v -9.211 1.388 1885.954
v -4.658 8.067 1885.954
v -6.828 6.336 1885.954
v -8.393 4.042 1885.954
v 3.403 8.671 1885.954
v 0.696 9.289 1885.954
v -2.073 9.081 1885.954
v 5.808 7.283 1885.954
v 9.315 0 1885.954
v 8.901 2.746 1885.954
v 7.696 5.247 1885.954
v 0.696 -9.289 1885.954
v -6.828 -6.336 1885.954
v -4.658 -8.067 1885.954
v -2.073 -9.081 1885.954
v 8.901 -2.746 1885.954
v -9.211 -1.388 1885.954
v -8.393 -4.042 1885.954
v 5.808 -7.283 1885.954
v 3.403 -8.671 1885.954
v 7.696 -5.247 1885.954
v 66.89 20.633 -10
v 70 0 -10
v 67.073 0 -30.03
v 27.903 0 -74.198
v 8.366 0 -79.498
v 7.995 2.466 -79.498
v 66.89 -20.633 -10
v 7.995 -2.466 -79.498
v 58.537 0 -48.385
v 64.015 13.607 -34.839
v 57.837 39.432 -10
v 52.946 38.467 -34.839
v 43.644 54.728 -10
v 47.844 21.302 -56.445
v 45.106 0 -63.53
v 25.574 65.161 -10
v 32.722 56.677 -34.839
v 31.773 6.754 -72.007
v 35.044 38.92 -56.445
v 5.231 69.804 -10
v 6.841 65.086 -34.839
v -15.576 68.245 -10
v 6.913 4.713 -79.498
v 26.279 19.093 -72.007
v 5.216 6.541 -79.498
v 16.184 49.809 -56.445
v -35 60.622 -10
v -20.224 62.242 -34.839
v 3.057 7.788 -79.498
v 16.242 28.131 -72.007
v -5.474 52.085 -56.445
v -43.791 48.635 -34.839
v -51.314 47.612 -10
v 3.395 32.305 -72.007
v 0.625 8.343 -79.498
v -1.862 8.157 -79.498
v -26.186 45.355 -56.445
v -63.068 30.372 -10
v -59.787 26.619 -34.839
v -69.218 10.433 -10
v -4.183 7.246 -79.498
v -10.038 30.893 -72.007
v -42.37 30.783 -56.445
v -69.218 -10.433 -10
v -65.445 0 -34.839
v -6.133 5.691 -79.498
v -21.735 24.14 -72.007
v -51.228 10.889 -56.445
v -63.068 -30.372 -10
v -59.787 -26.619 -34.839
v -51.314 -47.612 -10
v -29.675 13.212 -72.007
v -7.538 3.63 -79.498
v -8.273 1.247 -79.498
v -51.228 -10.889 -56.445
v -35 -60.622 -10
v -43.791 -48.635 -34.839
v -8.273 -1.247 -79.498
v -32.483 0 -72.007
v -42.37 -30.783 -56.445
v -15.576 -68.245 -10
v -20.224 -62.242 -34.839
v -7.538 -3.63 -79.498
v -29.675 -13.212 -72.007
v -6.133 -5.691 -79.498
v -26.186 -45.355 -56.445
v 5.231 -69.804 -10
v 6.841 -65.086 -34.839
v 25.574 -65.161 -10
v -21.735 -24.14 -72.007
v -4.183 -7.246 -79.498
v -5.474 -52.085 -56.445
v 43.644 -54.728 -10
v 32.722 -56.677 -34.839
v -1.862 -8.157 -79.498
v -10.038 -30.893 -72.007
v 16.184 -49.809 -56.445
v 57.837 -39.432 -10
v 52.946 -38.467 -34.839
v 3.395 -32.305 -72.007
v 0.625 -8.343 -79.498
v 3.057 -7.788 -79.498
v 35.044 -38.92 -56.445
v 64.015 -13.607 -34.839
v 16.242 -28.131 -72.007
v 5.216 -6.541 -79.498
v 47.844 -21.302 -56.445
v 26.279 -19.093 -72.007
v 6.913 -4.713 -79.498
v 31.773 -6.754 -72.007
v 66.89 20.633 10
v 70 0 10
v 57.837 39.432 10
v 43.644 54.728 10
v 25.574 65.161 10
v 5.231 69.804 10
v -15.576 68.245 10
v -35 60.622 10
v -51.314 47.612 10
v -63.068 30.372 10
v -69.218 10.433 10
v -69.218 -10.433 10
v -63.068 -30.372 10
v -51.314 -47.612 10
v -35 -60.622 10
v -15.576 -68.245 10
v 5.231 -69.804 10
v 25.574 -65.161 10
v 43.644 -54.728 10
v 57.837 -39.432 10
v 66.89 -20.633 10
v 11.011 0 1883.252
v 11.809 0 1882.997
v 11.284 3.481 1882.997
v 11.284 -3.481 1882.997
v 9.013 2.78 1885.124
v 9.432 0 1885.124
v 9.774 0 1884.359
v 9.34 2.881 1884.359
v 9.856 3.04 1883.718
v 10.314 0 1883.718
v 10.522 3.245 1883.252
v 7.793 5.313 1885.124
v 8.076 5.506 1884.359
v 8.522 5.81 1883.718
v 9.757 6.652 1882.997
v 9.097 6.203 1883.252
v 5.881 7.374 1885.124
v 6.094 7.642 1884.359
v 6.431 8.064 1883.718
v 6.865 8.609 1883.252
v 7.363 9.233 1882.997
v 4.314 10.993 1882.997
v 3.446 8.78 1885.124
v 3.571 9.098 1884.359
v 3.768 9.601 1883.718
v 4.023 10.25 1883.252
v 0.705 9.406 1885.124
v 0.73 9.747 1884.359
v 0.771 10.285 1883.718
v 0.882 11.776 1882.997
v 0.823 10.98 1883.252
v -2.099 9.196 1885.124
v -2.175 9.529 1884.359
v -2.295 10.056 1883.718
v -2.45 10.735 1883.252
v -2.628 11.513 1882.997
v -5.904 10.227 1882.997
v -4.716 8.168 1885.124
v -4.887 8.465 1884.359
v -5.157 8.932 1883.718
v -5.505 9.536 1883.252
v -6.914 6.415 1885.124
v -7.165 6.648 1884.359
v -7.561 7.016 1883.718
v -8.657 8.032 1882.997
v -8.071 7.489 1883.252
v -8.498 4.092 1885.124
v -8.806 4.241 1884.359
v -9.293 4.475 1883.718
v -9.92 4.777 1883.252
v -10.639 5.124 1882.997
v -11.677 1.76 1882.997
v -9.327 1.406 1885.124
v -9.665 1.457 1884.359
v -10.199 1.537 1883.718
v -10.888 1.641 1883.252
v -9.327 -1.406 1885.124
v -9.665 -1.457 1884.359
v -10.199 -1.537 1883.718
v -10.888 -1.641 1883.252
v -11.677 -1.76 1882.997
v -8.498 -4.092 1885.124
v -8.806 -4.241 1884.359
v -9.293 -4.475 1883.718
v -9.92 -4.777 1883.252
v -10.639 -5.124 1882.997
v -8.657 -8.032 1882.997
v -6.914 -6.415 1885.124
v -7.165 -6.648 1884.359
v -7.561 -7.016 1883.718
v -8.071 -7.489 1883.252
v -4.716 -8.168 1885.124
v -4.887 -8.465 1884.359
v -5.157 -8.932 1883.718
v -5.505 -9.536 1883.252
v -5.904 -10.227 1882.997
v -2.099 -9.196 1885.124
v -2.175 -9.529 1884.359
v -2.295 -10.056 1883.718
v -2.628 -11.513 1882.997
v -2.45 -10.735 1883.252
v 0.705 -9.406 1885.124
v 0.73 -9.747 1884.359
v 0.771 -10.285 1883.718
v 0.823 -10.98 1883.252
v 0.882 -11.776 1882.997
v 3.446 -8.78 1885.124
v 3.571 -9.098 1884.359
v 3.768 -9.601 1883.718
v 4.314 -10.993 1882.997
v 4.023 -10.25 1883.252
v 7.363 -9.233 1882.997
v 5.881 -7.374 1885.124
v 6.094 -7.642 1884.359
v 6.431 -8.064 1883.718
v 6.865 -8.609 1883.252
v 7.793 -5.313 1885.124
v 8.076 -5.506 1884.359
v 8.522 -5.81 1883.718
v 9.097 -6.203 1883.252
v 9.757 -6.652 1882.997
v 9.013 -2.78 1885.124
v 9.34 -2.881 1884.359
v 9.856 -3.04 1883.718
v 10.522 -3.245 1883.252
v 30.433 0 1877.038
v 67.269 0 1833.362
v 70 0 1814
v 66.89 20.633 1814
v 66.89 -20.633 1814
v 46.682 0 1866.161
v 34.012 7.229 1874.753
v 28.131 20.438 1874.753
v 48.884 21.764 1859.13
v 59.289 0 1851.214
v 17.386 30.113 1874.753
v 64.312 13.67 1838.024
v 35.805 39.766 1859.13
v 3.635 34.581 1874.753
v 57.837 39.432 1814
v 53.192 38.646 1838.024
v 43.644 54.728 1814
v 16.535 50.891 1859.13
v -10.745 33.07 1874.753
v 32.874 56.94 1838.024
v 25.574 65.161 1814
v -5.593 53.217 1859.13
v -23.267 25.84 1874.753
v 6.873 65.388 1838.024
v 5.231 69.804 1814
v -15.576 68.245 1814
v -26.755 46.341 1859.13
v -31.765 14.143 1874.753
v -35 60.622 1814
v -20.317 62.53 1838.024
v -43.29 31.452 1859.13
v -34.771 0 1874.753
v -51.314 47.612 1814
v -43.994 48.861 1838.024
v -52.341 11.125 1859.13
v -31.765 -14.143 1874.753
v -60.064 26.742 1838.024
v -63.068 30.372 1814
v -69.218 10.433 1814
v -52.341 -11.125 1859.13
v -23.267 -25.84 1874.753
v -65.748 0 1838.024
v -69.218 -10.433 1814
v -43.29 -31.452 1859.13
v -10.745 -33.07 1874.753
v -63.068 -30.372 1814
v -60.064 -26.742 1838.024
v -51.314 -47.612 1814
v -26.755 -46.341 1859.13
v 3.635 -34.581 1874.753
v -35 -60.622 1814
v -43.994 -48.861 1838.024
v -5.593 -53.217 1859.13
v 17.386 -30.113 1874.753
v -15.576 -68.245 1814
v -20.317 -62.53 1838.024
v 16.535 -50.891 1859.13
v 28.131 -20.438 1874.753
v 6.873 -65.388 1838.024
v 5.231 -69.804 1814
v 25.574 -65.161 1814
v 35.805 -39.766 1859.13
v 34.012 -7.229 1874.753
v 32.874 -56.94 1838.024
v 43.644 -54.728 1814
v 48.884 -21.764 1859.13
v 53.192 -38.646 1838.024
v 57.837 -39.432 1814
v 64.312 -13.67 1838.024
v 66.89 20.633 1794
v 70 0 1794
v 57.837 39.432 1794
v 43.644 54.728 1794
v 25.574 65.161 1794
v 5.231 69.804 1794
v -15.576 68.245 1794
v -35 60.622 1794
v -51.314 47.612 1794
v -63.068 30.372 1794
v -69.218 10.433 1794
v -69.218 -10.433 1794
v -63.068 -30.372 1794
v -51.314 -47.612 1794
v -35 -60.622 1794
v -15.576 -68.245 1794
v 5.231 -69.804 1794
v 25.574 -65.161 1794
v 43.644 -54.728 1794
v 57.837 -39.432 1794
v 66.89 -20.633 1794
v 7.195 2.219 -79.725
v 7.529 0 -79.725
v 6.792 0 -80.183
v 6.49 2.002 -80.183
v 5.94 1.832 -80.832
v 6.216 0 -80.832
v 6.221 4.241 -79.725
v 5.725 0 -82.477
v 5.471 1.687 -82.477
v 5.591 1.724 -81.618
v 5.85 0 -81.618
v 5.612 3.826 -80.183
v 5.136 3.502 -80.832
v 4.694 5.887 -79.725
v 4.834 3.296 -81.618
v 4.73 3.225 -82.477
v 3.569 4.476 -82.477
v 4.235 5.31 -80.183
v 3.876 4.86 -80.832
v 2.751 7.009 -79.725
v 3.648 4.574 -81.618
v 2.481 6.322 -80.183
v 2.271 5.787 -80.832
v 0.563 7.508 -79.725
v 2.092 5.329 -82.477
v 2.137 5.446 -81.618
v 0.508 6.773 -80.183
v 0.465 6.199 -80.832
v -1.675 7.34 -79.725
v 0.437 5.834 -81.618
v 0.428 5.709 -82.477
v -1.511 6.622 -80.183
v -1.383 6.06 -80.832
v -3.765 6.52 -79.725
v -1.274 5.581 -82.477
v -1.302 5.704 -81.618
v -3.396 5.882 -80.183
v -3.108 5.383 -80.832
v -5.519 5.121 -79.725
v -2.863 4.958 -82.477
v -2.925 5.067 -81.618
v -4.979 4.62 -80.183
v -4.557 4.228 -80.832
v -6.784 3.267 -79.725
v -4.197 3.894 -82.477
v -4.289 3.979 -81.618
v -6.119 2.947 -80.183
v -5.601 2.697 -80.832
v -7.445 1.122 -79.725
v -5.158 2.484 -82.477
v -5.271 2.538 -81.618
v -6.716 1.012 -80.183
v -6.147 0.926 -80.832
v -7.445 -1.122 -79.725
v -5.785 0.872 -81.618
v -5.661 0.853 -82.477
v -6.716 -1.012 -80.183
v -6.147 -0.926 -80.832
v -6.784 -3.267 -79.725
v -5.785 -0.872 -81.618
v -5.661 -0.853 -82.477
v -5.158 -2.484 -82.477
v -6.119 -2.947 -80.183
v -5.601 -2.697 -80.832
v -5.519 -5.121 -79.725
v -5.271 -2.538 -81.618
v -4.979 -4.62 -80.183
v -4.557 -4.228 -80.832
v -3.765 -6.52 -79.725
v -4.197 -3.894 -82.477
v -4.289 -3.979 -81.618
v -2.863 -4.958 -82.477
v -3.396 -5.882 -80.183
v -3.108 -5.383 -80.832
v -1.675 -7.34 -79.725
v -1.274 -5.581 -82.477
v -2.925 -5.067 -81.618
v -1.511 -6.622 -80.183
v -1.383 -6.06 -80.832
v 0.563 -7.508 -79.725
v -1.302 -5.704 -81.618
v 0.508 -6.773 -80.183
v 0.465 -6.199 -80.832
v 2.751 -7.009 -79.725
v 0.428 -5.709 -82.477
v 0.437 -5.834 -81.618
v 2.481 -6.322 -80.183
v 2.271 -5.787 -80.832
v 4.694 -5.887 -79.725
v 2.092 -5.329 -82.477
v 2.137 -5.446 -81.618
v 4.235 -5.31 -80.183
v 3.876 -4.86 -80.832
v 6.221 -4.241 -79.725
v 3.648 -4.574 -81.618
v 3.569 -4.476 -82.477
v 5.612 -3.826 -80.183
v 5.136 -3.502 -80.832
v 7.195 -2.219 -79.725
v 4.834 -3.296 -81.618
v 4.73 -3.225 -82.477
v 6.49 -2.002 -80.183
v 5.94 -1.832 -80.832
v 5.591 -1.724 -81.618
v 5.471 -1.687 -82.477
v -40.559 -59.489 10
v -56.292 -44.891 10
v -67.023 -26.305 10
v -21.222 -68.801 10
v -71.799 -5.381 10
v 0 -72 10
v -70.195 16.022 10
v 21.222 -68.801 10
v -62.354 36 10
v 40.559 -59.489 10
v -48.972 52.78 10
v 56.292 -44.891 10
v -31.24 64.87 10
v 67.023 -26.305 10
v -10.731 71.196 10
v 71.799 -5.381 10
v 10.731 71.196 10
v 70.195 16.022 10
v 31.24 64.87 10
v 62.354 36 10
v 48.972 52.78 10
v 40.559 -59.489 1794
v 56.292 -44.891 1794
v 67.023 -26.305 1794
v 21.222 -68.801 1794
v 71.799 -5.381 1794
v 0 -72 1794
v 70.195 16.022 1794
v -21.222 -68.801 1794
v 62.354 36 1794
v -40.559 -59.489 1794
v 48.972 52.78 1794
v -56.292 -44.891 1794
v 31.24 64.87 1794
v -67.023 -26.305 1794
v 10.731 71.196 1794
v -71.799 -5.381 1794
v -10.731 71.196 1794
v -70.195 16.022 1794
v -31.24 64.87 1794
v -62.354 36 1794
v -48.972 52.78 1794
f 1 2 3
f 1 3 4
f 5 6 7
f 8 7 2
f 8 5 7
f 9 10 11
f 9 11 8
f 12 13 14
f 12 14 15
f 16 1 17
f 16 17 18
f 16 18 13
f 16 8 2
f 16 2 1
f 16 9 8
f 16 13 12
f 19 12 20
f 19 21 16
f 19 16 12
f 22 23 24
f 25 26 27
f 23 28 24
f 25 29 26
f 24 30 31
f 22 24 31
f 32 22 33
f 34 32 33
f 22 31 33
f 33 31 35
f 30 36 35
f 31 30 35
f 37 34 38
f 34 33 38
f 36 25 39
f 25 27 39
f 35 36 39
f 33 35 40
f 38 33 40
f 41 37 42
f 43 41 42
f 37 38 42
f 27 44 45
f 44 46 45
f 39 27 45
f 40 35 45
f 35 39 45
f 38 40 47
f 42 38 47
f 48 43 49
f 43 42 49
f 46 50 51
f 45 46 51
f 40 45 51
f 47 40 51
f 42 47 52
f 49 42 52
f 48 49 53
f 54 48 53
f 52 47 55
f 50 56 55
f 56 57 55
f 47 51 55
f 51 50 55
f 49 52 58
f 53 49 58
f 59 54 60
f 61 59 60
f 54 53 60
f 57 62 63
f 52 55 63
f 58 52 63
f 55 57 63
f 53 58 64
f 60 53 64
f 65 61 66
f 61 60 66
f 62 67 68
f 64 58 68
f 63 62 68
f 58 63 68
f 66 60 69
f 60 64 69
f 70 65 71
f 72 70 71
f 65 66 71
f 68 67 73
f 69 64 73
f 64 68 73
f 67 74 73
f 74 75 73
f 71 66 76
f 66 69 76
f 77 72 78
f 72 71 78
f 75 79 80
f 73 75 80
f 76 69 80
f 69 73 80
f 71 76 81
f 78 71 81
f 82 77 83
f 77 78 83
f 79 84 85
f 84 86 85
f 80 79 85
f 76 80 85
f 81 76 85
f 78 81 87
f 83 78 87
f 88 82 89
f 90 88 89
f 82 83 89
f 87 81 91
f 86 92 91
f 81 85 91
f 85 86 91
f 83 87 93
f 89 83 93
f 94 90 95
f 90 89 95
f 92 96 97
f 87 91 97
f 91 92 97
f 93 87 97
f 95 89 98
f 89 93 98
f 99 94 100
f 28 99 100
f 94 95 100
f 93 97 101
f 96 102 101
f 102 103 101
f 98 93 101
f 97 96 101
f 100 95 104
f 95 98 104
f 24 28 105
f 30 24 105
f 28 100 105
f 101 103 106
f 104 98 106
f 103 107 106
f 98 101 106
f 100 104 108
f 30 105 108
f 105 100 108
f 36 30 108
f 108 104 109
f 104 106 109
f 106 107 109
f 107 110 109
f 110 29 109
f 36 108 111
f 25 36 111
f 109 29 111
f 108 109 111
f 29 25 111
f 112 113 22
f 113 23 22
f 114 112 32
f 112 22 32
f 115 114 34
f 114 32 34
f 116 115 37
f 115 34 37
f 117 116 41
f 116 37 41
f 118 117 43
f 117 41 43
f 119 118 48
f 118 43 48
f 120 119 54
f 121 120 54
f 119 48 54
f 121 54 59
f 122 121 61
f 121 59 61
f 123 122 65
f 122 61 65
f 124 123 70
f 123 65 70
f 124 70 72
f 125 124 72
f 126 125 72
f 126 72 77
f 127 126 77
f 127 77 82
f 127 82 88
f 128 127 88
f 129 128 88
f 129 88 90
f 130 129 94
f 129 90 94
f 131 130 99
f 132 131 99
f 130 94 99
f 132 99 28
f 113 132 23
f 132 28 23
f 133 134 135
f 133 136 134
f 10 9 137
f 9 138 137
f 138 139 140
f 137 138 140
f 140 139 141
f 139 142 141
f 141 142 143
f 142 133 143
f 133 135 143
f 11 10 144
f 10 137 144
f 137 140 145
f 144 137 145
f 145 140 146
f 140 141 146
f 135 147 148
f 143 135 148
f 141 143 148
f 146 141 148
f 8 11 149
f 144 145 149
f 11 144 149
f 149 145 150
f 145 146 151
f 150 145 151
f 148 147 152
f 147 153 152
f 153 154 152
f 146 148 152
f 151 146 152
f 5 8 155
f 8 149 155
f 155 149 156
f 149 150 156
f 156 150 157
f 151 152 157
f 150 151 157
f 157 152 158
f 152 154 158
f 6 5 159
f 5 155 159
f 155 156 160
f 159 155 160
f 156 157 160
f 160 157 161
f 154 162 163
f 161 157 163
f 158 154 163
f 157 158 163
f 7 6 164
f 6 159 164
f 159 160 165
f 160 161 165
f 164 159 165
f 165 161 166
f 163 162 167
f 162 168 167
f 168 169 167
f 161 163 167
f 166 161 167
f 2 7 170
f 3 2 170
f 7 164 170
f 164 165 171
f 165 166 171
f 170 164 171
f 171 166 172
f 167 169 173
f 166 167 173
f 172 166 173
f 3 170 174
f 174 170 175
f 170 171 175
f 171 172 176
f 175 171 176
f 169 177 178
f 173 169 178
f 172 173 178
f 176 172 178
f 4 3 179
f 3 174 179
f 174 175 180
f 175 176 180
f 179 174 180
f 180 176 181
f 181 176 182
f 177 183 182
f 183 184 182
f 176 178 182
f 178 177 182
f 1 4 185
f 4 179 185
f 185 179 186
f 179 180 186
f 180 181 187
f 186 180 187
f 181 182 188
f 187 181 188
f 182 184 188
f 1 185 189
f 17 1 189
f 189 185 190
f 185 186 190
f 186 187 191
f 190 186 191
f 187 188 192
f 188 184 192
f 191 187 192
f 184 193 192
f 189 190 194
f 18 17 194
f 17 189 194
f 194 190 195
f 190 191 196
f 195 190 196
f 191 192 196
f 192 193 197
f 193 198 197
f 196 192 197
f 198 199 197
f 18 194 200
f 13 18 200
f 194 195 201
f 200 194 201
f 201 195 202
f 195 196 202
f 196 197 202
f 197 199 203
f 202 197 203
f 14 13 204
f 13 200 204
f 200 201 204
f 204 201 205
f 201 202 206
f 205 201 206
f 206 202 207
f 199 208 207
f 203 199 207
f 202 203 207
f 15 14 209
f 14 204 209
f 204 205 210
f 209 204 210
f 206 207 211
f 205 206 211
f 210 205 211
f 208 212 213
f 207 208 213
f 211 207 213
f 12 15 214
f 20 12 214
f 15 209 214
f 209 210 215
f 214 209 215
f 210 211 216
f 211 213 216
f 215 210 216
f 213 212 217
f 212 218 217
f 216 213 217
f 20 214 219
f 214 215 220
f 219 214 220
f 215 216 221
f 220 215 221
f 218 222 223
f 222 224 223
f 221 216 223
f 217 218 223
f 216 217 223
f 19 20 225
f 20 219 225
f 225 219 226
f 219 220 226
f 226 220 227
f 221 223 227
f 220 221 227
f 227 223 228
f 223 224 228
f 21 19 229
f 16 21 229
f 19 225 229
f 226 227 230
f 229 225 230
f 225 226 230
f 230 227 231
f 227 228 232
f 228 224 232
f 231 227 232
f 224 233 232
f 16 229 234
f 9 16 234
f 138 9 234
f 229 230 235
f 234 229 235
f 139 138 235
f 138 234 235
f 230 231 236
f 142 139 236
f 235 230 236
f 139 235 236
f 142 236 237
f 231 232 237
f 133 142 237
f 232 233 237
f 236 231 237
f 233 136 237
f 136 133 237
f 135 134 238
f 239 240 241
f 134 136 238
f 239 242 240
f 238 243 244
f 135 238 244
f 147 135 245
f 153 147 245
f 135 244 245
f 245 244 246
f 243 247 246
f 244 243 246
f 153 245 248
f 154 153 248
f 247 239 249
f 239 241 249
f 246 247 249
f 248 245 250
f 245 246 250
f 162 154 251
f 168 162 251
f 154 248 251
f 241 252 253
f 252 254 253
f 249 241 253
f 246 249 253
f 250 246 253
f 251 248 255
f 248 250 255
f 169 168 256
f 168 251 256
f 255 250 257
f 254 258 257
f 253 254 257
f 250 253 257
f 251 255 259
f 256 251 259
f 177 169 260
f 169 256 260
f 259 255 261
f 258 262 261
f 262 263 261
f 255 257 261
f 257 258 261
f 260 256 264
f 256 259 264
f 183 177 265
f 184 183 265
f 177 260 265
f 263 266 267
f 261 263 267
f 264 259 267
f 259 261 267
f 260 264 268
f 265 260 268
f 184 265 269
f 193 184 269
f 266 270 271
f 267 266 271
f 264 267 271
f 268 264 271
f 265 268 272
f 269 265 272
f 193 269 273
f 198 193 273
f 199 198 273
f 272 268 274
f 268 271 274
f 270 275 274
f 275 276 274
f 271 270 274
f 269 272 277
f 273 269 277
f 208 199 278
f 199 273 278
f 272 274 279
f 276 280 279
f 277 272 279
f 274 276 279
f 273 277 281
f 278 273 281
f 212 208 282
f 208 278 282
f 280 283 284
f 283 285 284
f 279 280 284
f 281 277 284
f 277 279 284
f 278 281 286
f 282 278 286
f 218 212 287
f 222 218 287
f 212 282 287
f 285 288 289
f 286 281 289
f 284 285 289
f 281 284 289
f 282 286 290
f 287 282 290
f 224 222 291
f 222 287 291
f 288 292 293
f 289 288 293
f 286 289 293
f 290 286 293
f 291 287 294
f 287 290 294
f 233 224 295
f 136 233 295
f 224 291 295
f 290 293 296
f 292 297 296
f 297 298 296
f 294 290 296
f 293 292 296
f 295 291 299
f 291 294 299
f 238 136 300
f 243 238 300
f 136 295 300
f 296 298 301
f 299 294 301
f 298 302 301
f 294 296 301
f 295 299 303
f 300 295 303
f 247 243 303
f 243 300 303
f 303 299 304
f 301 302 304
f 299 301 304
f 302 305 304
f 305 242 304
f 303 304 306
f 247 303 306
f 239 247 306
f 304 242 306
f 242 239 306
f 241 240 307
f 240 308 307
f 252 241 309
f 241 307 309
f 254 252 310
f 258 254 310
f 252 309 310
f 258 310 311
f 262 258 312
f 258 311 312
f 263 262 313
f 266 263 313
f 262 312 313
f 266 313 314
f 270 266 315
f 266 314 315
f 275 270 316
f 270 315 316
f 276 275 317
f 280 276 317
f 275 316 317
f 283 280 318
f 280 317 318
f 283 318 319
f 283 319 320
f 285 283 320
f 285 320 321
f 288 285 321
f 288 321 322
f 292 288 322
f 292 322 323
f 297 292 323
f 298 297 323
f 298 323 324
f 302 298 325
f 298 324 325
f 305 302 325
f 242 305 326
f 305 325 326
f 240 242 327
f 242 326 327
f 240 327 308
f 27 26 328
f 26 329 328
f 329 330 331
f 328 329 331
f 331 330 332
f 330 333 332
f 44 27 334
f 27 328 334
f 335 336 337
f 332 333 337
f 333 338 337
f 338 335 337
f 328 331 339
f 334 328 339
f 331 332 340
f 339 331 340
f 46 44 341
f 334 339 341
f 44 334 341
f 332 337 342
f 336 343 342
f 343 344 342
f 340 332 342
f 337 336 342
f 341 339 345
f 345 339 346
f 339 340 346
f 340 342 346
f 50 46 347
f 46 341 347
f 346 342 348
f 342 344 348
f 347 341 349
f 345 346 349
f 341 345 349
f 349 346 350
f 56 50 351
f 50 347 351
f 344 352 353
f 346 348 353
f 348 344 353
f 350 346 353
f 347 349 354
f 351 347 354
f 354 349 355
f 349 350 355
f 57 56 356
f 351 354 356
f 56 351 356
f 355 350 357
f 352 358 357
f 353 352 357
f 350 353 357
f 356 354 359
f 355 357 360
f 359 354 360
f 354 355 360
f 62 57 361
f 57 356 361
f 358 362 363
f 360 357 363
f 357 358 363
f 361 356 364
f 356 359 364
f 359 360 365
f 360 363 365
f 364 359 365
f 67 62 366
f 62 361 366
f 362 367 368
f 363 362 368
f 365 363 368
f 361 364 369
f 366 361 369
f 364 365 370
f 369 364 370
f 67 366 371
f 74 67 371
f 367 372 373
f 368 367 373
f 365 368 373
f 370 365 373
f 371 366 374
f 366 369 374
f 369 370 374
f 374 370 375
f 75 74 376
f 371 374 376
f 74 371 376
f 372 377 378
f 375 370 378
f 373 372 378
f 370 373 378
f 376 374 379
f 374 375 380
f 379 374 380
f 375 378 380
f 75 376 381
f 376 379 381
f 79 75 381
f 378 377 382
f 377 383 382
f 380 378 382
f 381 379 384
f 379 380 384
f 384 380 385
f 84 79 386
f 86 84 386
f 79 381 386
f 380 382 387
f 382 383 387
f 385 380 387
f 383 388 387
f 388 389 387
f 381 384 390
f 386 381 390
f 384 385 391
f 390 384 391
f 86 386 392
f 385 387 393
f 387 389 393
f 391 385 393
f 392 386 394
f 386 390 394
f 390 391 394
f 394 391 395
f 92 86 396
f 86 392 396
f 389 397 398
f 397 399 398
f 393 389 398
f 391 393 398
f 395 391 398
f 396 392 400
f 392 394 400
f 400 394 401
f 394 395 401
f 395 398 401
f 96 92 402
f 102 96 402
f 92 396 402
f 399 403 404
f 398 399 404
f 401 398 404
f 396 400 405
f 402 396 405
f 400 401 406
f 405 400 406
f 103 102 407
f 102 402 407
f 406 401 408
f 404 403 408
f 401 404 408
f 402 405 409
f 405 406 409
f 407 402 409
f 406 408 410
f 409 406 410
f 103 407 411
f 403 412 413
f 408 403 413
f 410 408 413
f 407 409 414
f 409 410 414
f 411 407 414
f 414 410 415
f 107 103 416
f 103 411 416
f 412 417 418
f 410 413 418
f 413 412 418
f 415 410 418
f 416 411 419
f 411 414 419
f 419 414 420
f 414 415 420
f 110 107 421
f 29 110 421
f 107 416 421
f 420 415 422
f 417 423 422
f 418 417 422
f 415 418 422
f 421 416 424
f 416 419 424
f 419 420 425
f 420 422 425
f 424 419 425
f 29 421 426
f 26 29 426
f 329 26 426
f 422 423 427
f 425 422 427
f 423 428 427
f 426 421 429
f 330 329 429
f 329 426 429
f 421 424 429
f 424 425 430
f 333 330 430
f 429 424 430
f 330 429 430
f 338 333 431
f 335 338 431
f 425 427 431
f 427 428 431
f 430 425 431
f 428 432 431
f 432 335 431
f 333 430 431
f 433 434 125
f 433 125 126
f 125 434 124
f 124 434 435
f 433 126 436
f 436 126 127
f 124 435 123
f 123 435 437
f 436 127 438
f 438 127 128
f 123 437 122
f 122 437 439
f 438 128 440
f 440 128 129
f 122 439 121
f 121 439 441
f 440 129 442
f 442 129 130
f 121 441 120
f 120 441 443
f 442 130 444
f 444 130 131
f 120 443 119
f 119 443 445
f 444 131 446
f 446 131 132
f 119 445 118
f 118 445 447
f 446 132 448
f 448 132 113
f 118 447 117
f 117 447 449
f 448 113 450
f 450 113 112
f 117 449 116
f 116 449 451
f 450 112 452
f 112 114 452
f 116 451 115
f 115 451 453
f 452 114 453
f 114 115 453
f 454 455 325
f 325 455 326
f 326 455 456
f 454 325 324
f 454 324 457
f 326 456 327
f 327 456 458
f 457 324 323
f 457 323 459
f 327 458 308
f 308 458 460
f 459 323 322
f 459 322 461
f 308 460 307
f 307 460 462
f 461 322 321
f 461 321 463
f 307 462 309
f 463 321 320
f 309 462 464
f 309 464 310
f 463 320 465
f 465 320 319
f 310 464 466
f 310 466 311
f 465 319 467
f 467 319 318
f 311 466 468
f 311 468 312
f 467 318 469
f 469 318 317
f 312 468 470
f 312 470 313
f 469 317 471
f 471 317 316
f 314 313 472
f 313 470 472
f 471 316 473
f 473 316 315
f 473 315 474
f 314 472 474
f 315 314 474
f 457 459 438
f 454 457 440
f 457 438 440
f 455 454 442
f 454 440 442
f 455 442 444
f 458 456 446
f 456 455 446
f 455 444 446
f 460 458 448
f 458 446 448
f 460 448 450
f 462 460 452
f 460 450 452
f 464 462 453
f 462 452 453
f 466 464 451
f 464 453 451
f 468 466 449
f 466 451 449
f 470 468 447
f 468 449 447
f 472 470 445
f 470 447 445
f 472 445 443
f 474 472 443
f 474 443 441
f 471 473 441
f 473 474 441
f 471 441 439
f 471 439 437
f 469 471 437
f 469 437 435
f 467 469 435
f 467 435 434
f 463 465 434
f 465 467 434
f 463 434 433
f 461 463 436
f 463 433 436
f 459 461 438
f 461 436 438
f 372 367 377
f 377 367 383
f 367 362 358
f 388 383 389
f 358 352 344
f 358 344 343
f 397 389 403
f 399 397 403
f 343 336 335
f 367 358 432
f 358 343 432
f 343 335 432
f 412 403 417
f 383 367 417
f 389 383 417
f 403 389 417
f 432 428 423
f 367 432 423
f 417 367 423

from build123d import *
from OCP.BRepAlgoAPI import BRepAlgoAPI_Cut
from OCP.TopTools import TopTools_ListOfShape

# Parameters (mm, degrees)
BOSS_EXTRUDE1_DEPTH      = 1885.953741
BOSS_EXTRUDE1_DEPTH_BACK = 82.476716
SKETCH1_R                = 72


with BuildPart() as part:
    # Sketch1 → Boss-Extrude1 (new, two sides: drawn at the far end of the back side and taken through both)
    with BuildSketch(Plane.XY.offset(-BOSS_EXTRUDE1_DEPTH_BACK)):
        with Locations(Location((0, 0, 0), (0, 0, 270))):
            Circle(SKETCH1_R)
    extrude(amount=BOSS_EXTRUDE1_DEPTH + BOSS_EXTRUDE1_DEPTH_BACK)


with BuildPart() as cavity3_tool:
    # Cavity3: read off the stored shape, not the designer's step
    # Cavity3 outline → Cavity3 (revolve)
    with BuildSketch(Plane.XZ):
        with BuildLine():
            Line((72, -82.476716089), (72, 10))
            Line((72, 10), (70, 10))
            Line((70, 10), (70, -9.999999977))
            ThreePointArc((70, -9.999999977), (52.371990052, -56.445394367), (8.366438321, -79.498220911))
            ThreePointArc((8.366438321, -79.498220911), (6.48048614, -80.486199187), (5.725, -82.476716089))
            Line((5.725, -82.476716089), (72, -82.476716089))
        make_face()
        with BuildLine():
            Line((70, 1813.99999993), (70, 1794))
            Line((70, 1794), (72, 1794))
            Line((72, 1794), (72, 1885.953740521))
            Line((72, 1885.953740521), (9.315, 1885.953740521))
            ThreePointArc((9.315, 1885.953740521), (10.021717672, 1884.019611217), (11.80890411, 1882.996737486))
            ThreePointArc((11.80890411, 1882.996737486), (53.509920985, 1859.129683759), (70, 1813.99999993))
        make_face()
    revolve(axis=Axis((0, 0, 0), (0, 0, 1)))


with BuildPart() as part_1:
    add(part.part)

    # Cavity3: cut by cavity3_tool, with a tolerance
    cavity3_stock = TopTools_ListOfShape()
    cavity3_stock.Append(part_1.part.wrapped)
    cavity3_tools = TopTools_ListOfShape()
    cavity3_tools.Append(cavity3_tool.part.wrapped)
    cavity3_cut = BRepAlgoAPI_Cut()
    cavity3_cut.SetArguments(cavity3_stock)
    cavity3_cut.SetTools(cavity3_tools)
    cavity3_cut.SetFuzzyValue(0.00001)
    cavity3_cut.Build()
    add(Compound.cast(cavity3_cut.Shape()).solids(), mode=Mode.REPLACE)


solid = part_1.part
